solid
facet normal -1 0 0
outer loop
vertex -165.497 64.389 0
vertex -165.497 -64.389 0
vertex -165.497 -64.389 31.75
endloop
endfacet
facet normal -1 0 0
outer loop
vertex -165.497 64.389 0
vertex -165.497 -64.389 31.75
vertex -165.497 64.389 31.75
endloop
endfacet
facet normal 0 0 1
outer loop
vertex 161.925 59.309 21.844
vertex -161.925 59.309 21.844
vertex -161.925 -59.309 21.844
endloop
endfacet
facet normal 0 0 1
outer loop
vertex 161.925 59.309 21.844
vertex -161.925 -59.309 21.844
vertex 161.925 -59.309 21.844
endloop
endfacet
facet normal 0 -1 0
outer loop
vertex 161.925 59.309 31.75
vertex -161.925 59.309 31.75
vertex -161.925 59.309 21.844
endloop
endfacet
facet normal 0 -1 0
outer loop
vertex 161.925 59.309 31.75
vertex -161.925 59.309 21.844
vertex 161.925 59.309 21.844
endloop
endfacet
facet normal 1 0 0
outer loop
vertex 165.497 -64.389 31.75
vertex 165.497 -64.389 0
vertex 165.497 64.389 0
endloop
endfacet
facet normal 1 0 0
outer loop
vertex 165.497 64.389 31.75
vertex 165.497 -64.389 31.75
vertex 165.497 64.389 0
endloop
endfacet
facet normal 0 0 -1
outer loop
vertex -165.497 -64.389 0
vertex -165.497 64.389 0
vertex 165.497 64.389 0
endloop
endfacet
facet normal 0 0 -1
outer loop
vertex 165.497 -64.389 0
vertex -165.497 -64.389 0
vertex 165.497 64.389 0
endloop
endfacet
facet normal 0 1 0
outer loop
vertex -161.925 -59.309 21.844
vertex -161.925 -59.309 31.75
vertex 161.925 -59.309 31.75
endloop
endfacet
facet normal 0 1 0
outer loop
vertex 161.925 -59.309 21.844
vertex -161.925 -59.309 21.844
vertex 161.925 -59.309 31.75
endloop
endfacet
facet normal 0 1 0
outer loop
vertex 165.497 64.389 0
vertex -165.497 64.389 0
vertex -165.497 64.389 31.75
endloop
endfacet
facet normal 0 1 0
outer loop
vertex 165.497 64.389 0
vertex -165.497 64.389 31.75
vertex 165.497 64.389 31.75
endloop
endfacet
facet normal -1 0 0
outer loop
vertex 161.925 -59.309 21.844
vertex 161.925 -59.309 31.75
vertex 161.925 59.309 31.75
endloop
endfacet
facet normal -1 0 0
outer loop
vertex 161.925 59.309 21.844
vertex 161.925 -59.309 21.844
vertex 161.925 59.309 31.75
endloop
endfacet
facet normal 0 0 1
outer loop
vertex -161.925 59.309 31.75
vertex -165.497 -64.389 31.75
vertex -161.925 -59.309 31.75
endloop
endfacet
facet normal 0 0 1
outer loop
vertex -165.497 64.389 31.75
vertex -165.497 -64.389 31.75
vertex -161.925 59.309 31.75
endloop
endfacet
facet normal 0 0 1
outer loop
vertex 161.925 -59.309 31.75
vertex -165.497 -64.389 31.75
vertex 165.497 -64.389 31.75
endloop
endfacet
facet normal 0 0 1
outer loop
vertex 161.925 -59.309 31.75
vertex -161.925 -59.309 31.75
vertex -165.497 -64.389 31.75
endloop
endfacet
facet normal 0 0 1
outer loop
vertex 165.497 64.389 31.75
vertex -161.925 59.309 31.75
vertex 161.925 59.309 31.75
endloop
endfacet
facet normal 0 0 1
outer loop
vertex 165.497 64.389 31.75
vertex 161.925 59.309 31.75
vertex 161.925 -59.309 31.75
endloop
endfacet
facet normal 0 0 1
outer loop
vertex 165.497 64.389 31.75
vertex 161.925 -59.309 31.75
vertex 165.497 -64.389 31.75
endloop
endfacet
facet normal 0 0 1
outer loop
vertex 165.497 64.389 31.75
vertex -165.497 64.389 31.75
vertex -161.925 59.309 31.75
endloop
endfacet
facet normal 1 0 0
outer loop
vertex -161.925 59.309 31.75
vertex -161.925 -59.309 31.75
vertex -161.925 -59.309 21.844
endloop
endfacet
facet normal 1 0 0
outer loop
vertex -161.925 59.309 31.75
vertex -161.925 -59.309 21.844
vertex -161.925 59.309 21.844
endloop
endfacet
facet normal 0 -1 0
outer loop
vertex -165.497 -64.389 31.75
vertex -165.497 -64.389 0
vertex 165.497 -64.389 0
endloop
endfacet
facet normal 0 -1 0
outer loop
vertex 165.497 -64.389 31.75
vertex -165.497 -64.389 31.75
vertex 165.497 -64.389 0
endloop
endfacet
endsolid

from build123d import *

# Parameters (mm, degrees)
SKETCH002_W      = 323.85
SKETCH002_H      = 118.618
EXTRUDE002_DEPTH = 9.906
SKETCH001_W      = 323.85
SKETCH001_H      = 128.778
EXTRUDE001_DEPTH = 9.906
SKETCH_W         = 330.99375
SKETCH_H         = 128.778
EXTRUDE_DEPTH    = 31.75


with BuildPart() as extrude002:
    # Sketch002 (on Face6 of Cut) → Extrude002 (new body)
    with BuildSketch(Plane.XY.offset(31.75)):
        Rectangle(SKETCH002_W, SKETCH002_H)
    extrude(amount=-EXTRUDE002_DEPTH)


with BuildPart() as extrude001:
    # Sketch001 (on Face6 of Extrude) → Extrude001 (new body)
    with BuildSketch(Plane.XY.offset(31.75)):
        with Locations((334.565625, 0)):
            Rectangle(SKETCH001_W, SKETCH001_H)
    extrude(amount=-EXTRUDE001_DEPTH)


with BuildPart() as cut001:
    # Sketch → Extrude (new body)
    with BuildSketch(Plane.XY):
        Rectangle(SKETCH_W, SKETCH_H)
    extrude(amount=EXTRUDE_DEPTH)

    # Cut: cut Extrude001
    add(extrude001.part, mode=Mode.SUBTRACT)

    # Cut001: cut Extrude002
    add(extrude002.part, mode=Mode.SUBTRACT)


solid = cut001.part
